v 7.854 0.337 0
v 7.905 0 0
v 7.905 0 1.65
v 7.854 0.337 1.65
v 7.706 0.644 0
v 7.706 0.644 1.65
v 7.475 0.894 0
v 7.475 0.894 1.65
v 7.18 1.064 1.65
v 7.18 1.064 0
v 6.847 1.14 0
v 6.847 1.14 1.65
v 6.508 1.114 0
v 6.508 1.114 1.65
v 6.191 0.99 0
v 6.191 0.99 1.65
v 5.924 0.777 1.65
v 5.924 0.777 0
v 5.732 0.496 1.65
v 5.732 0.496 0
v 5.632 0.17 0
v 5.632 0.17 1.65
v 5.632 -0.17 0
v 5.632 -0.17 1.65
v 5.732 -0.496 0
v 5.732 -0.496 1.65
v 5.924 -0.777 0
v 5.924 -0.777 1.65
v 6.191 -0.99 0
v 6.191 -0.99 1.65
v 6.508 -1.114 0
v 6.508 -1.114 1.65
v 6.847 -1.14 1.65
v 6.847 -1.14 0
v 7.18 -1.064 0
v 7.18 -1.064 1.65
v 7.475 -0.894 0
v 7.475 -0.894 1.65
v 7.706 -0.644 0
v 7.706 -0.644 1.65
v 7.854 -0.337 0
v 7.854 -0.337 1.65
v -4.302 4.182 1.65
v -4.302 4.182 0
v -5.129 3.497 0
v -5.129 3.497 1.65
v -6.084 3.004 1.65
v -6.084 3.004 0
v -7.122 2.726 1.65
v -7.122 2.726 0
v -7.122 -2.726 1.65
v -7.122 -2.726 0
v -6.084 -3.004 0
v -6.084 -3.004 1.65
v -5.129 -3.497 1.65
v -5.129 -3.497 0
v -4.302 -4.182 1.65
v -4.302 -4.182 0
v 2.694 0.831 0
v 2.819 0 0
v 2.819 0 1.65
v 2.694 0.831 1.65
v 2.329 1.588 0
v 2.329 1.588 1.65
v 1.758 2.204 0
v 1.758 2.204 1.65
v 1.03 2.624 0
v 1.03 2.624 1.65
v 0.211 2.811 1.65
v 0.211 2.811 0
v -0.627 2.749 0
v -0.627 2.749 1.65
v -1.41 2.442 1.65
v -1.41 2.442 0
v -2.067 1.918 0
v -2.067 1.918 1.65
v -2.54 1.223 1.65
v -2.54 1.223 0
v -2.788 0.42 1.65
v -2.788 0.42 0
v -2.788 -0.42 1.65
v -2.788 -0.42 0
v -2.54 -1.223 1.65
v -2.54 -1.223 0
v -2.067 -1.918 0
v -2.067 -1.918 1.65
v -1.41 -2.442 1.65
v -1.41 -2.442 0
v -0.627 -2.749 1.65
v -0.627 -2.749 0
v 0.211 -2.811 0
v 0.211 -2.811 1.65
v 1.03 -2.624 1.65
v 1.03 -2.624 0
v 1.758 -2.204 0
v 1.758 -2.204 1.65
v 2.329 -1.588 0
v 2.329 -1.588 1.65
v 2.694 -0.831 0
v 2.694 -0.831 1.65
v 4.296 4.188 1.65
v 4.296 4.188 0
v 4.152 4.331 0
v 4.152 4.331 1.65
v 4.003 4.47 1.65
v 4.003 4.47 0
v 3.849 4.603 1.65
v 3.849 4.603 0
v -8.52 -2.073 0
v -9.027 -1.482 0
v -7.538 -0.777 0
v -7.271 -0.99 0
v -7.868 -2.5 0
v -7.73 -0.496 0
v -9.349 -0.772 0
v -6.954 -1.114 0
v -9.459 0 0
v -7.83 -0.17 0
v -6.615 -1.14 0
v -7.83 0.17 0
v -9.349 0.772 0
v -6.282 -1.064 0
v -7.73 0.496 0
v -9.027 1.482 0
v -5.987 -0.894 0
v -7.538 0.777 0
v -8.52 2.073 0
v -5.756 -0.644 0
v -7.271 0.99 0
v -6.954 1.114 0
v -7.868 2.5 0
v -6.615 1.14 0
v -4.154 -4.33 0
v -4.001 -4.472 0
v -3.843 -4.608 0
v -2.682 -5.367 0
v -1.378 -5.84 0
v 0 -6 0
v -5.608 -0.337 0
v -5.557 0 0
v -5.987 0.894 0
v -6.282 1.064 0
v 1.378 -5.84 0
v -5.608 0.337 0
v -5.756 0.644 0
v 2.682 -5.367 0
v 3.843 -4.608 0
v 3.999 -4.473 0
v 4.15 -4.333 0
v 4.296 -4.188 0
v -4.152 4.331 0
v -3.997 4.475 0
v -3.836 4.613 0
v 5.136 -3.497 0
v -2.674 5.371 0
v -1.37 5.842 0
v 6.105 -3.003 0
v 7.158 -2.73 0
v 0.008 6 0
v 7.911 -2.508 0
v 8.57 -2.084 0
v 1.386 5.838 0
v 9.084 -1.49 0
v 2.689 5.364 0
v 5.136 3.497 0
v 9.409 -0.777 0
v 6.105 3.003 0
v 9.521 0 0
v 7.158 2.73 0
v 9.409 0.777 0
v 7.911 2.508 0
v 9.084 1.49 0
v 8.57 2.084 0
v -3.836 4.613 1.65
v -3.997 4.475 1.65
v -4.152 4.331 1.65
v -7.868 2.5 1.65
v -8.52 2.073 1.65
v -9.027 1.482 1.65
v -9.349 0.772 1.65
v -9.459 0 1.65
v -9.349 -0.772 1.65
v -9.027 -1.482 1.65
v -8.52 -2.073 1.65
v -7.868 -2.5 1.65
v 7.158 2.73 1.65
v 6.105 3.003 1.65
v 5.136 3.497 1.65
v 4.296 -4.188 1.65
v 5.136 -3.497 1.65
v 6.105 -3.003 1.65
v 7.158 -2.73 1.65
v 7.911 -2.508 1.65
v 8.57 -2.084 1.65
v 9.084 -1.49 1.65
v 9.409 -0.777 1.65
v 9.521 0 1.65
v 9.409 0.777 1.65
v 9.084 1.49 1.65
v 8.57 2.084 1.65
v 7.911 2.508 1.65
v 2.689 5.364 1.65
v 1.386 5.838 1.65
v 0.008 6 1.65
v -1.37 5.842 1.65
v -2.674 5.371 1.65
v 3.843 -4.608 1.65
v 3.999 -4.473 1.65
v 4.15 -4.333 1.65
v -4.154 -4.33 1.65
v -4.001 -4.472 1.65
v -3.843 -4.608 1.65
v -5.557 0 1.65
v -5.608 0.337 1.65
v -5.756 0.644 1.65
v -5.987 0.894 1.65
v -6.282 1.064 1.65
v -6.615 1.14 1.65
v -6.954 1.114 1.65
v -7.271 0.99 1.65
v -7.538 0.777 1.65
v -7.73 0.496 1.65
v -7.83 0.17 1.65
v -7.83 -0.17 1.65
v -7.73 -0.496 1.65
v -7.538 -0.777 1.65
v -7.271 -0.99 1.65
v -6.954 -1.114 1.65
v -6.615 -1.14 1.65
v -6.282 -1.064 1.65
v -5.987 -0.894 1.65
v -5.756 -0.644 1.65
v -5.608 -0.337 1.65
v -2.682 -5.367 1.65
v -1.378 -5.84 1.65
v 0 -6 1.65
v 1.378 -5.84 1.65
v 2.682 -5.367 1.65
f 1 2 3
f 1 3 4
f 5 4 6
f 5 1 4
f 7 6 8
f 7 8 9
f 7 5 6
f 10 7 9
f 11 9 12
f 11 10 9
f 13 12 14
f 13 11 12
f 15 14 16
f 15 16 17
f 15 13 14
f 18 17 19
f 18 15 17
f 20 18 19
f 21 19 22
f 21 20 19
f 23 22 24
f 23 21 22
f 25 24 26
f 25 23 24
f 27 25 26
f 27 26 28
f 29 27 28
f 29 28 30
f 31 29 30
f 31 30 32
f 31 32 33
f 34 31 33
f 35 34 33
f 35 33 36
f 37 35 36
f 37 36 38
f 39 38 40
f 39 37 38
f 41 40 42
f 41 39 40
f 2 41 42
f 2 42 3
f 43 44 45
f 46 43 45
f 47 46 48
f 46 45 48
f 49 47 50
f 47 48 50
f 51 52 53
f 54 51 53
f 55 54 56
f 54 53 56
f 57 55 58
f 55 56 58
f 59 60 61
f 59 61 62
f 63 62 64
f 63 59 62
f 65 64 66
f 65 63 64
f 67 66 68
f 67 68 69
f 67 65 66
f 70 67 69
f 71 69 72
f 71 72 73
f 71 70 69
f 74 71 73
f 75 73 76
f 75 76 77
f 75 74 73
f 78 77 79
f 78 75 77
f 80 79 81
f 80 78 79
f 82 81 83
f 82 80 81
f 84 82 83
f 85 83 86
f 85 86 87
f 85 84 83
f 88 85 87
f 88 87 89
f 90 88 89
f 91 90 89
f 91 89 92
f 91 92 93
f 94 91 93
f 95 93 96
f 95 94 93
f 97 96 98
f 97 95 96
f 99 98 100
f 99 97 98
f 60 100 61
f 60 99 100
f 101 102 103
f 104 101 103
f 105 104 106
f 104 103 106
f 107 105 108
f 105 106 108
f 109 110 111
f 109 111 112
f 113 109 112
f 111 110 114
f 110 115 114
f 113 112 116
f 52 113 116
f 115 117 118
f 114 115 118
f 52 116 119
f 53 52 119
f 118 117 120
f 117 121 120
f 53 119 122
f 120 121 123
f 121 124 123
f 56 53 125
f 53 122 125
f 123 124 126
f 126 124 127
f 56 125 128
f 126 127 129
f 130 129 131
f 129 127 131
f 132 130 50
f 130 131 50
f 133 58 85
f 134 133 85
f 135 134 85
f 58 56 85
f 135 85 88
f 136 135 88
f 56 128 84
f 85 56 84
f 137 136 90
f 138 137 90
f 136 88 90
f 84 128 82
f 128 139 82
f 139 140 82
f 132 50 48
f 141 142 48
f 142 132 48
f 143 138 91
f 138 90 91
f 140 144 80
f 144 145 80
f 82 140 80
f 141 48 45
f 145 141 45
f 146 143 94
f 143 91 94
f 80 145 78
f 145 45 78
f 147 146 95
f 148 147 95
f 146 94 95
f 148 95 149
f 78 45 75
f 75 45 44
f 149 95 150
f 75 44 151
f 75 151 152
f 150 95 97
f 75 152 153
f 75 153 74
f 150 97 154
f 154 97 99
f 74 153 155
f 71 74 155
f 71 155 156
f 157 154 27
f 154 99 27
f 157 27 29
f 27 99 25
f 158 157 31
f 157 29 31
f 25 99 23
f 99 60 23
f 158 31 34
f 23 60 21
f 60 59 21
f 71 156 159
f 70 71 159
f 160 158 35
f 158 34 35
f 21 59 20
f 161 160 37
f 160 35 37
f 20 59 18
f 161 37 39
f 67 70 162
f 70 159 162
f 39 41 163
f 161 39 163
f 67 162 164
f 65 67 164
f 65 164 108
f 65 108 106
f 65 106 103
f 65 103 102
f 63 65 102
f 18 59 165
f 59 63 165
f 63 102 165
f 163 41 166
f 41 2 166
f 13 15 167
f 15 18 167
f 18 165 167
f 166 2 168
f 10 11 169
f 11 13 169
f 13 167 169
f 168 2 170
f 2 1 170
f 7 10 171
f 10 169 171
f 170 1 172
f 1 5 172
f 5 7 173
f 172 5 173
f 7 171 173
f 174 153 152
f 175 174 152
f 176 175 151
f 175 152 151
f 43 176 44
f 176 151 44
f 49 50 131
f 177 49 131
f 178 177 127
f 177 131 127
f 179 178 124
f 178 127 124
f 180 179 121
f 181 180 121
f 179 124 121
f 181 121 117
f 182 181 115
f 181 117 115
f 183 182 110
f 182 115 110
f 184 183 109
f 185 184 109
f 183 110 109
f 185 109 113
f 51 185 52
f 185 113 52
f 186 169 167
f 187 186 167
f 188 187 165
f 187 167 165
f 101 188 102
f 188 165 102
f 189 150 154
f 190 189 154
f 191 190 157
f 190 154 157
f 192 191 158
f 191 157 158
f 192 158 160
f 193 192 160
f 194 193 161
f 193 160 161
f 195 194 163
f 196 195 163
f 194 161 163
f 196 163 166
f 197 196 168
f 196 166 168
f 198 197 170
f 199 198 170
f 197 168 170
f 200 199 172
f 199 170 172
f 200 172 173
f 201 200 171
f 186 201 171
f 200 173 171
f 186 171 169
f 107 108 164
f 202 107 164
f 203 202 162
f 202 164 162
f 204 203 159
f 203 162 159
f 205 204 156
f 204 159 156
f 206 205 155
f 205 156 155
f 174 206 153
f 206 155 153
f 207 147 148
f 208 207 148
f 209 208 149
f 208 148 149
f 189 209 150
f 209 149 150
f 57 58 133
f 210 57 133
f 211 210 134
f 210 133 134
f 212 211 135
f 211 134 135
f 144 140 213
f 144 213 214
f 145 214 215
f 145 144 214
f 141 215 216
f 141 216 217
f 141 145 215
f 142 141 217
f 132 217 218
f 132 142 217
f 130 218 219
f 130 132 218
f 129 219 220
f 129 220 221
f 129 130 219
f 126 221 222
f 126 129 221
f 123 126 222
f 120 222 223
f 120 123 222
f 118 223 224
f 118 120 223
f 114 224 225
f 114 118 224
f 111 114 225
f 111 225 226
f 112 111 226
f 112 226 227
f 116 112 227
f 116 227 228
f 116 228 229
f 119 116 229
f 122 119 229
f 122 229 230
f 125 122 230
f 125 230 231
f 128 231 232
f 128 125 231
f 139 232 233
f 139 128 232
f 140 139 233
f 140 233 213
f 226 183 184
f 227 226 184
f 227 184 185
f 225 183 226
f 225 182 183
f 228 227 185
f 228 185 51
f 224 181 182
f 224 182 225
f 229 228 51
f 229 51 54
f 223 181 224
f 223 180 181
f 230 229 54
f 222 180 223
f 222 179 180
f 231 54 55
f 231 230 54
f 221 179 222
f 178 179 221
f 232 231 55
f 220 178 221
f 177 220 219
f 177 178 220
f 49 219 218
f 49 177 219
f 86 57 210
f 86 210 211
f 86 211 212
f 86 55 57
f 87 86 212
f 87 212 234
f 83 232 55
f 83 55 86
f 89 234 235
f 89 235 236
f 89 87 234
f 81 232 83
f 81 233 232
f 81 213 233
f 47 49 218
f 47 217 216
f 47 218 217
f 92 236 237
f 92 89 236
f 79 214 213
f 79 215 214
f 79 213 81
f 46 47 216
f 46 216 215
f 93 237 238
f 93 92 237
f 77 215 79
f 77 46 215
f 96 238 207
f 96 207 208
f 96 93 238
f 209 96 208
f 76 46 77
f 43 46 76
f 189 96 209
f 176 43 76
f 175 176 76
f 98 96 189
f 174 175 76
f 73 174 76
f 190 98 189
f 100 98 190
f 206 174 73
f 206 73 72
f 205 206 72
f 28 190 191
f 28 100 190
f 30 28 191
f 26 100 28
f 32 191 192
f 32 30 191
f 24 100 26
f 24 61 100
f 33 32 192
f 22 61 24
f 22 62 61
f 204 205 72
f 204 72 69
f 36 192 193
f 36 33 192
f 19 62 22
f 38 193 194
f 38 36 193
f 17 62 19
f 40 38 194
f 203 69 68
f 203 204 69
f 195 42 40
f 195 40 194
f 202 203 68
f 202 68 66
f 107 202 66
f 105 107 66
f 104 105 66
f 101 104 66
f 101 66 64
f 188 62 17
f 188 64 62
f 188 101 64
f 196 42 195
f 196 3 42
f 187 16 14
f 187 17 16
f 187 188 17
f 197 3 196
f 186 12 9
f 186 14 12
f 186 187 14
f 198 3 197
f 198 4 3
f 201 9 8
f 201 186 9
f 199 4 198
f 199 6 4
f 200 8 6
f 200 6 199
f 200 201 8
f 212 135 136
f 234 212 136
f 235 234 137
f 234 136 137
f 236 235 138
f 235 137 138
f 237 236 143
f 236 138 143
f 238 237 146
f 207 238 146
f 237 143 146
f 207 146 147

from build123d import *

# Parameters (mm, degrees)
ESBO_O1_R                = 1.143
ESBO_O1_R_2              = 2.819211747
RESSALTO_EXTRUS_O1_DEPTH = 1.65


with BuildPart() as part:
    # Esboço1 → Ressalto-extrusão1 (new body)
    with BuildSketch(Plane.XY):
        with BuildLine():
            ThreePointArc((-4.302124406, -4.182311163), (-4.077931794, -4.401189993), (-3.842618859, -4.608066989))
            ThreePointArc((-3.842618859, -4.608066989), (0, -6.000000089), (3.842618859, -4.608066989))
            ThreePointArc((3.842618859, -4.608066989), (4.074890318, -4.404006128), (4.296341713, -4.188251301))
            ThreePointArc((4.296341713, -4.188251301), (5.607085842, -3.223218185), (7.158341274, -2.730322991))
            ThreePointArc((7.158341274, -2.730322991), (9.52094015, 0), (7.158341274, 2.730322991))
            ThreePointArc((7.158341274, 2.730322991), (5.607085842, 3.223218185), (4.296341713, 4.188251301))
            ThreePointArc((4.296341713, 4.188251301), (4.077931794, 4.401189993), (3.848982033, 4.602753348))
            ThreePointArc((3.848982033, 4.602753348), (0.008290039, 5.999994362), (-3.836248349, 4.613371834))
            ThreePointArc((-3.836248349, 4.613371834), (-4.074890318, 4.404006128), (-4.302124406, 4.182311163))
            ThreePointArc((-4.302124406, 4.182311163), (-5.593565523, 3.224698333), (-7.12215689, 2.726450484))
            ThreePointArc((-7.12215689, 2.726450484), (-9.458939648, 0), (-7.12215689, -2.726450484))
            ThreePointArc((-7.12215689, -2.726450484), (-5.593565523, -3.224698333), (-4.302124406, -4.182311163))
        make_face()
        with Locations((6.76200015, 0)):
            Circle(ESBO_O1_R, mode=Mode.SUBTRACT)
        with Locations((-6.69999985, 0)):
            Circle(ESBO_O1_R, mode=Mode.SUBTRACT)
        Circle(ESBO_O1_R_2, mode=Mode.SUBTRACT)
    extrude(amount=RESSALTO_EXTRUS_O1_DEPTH)


solid = part.part
